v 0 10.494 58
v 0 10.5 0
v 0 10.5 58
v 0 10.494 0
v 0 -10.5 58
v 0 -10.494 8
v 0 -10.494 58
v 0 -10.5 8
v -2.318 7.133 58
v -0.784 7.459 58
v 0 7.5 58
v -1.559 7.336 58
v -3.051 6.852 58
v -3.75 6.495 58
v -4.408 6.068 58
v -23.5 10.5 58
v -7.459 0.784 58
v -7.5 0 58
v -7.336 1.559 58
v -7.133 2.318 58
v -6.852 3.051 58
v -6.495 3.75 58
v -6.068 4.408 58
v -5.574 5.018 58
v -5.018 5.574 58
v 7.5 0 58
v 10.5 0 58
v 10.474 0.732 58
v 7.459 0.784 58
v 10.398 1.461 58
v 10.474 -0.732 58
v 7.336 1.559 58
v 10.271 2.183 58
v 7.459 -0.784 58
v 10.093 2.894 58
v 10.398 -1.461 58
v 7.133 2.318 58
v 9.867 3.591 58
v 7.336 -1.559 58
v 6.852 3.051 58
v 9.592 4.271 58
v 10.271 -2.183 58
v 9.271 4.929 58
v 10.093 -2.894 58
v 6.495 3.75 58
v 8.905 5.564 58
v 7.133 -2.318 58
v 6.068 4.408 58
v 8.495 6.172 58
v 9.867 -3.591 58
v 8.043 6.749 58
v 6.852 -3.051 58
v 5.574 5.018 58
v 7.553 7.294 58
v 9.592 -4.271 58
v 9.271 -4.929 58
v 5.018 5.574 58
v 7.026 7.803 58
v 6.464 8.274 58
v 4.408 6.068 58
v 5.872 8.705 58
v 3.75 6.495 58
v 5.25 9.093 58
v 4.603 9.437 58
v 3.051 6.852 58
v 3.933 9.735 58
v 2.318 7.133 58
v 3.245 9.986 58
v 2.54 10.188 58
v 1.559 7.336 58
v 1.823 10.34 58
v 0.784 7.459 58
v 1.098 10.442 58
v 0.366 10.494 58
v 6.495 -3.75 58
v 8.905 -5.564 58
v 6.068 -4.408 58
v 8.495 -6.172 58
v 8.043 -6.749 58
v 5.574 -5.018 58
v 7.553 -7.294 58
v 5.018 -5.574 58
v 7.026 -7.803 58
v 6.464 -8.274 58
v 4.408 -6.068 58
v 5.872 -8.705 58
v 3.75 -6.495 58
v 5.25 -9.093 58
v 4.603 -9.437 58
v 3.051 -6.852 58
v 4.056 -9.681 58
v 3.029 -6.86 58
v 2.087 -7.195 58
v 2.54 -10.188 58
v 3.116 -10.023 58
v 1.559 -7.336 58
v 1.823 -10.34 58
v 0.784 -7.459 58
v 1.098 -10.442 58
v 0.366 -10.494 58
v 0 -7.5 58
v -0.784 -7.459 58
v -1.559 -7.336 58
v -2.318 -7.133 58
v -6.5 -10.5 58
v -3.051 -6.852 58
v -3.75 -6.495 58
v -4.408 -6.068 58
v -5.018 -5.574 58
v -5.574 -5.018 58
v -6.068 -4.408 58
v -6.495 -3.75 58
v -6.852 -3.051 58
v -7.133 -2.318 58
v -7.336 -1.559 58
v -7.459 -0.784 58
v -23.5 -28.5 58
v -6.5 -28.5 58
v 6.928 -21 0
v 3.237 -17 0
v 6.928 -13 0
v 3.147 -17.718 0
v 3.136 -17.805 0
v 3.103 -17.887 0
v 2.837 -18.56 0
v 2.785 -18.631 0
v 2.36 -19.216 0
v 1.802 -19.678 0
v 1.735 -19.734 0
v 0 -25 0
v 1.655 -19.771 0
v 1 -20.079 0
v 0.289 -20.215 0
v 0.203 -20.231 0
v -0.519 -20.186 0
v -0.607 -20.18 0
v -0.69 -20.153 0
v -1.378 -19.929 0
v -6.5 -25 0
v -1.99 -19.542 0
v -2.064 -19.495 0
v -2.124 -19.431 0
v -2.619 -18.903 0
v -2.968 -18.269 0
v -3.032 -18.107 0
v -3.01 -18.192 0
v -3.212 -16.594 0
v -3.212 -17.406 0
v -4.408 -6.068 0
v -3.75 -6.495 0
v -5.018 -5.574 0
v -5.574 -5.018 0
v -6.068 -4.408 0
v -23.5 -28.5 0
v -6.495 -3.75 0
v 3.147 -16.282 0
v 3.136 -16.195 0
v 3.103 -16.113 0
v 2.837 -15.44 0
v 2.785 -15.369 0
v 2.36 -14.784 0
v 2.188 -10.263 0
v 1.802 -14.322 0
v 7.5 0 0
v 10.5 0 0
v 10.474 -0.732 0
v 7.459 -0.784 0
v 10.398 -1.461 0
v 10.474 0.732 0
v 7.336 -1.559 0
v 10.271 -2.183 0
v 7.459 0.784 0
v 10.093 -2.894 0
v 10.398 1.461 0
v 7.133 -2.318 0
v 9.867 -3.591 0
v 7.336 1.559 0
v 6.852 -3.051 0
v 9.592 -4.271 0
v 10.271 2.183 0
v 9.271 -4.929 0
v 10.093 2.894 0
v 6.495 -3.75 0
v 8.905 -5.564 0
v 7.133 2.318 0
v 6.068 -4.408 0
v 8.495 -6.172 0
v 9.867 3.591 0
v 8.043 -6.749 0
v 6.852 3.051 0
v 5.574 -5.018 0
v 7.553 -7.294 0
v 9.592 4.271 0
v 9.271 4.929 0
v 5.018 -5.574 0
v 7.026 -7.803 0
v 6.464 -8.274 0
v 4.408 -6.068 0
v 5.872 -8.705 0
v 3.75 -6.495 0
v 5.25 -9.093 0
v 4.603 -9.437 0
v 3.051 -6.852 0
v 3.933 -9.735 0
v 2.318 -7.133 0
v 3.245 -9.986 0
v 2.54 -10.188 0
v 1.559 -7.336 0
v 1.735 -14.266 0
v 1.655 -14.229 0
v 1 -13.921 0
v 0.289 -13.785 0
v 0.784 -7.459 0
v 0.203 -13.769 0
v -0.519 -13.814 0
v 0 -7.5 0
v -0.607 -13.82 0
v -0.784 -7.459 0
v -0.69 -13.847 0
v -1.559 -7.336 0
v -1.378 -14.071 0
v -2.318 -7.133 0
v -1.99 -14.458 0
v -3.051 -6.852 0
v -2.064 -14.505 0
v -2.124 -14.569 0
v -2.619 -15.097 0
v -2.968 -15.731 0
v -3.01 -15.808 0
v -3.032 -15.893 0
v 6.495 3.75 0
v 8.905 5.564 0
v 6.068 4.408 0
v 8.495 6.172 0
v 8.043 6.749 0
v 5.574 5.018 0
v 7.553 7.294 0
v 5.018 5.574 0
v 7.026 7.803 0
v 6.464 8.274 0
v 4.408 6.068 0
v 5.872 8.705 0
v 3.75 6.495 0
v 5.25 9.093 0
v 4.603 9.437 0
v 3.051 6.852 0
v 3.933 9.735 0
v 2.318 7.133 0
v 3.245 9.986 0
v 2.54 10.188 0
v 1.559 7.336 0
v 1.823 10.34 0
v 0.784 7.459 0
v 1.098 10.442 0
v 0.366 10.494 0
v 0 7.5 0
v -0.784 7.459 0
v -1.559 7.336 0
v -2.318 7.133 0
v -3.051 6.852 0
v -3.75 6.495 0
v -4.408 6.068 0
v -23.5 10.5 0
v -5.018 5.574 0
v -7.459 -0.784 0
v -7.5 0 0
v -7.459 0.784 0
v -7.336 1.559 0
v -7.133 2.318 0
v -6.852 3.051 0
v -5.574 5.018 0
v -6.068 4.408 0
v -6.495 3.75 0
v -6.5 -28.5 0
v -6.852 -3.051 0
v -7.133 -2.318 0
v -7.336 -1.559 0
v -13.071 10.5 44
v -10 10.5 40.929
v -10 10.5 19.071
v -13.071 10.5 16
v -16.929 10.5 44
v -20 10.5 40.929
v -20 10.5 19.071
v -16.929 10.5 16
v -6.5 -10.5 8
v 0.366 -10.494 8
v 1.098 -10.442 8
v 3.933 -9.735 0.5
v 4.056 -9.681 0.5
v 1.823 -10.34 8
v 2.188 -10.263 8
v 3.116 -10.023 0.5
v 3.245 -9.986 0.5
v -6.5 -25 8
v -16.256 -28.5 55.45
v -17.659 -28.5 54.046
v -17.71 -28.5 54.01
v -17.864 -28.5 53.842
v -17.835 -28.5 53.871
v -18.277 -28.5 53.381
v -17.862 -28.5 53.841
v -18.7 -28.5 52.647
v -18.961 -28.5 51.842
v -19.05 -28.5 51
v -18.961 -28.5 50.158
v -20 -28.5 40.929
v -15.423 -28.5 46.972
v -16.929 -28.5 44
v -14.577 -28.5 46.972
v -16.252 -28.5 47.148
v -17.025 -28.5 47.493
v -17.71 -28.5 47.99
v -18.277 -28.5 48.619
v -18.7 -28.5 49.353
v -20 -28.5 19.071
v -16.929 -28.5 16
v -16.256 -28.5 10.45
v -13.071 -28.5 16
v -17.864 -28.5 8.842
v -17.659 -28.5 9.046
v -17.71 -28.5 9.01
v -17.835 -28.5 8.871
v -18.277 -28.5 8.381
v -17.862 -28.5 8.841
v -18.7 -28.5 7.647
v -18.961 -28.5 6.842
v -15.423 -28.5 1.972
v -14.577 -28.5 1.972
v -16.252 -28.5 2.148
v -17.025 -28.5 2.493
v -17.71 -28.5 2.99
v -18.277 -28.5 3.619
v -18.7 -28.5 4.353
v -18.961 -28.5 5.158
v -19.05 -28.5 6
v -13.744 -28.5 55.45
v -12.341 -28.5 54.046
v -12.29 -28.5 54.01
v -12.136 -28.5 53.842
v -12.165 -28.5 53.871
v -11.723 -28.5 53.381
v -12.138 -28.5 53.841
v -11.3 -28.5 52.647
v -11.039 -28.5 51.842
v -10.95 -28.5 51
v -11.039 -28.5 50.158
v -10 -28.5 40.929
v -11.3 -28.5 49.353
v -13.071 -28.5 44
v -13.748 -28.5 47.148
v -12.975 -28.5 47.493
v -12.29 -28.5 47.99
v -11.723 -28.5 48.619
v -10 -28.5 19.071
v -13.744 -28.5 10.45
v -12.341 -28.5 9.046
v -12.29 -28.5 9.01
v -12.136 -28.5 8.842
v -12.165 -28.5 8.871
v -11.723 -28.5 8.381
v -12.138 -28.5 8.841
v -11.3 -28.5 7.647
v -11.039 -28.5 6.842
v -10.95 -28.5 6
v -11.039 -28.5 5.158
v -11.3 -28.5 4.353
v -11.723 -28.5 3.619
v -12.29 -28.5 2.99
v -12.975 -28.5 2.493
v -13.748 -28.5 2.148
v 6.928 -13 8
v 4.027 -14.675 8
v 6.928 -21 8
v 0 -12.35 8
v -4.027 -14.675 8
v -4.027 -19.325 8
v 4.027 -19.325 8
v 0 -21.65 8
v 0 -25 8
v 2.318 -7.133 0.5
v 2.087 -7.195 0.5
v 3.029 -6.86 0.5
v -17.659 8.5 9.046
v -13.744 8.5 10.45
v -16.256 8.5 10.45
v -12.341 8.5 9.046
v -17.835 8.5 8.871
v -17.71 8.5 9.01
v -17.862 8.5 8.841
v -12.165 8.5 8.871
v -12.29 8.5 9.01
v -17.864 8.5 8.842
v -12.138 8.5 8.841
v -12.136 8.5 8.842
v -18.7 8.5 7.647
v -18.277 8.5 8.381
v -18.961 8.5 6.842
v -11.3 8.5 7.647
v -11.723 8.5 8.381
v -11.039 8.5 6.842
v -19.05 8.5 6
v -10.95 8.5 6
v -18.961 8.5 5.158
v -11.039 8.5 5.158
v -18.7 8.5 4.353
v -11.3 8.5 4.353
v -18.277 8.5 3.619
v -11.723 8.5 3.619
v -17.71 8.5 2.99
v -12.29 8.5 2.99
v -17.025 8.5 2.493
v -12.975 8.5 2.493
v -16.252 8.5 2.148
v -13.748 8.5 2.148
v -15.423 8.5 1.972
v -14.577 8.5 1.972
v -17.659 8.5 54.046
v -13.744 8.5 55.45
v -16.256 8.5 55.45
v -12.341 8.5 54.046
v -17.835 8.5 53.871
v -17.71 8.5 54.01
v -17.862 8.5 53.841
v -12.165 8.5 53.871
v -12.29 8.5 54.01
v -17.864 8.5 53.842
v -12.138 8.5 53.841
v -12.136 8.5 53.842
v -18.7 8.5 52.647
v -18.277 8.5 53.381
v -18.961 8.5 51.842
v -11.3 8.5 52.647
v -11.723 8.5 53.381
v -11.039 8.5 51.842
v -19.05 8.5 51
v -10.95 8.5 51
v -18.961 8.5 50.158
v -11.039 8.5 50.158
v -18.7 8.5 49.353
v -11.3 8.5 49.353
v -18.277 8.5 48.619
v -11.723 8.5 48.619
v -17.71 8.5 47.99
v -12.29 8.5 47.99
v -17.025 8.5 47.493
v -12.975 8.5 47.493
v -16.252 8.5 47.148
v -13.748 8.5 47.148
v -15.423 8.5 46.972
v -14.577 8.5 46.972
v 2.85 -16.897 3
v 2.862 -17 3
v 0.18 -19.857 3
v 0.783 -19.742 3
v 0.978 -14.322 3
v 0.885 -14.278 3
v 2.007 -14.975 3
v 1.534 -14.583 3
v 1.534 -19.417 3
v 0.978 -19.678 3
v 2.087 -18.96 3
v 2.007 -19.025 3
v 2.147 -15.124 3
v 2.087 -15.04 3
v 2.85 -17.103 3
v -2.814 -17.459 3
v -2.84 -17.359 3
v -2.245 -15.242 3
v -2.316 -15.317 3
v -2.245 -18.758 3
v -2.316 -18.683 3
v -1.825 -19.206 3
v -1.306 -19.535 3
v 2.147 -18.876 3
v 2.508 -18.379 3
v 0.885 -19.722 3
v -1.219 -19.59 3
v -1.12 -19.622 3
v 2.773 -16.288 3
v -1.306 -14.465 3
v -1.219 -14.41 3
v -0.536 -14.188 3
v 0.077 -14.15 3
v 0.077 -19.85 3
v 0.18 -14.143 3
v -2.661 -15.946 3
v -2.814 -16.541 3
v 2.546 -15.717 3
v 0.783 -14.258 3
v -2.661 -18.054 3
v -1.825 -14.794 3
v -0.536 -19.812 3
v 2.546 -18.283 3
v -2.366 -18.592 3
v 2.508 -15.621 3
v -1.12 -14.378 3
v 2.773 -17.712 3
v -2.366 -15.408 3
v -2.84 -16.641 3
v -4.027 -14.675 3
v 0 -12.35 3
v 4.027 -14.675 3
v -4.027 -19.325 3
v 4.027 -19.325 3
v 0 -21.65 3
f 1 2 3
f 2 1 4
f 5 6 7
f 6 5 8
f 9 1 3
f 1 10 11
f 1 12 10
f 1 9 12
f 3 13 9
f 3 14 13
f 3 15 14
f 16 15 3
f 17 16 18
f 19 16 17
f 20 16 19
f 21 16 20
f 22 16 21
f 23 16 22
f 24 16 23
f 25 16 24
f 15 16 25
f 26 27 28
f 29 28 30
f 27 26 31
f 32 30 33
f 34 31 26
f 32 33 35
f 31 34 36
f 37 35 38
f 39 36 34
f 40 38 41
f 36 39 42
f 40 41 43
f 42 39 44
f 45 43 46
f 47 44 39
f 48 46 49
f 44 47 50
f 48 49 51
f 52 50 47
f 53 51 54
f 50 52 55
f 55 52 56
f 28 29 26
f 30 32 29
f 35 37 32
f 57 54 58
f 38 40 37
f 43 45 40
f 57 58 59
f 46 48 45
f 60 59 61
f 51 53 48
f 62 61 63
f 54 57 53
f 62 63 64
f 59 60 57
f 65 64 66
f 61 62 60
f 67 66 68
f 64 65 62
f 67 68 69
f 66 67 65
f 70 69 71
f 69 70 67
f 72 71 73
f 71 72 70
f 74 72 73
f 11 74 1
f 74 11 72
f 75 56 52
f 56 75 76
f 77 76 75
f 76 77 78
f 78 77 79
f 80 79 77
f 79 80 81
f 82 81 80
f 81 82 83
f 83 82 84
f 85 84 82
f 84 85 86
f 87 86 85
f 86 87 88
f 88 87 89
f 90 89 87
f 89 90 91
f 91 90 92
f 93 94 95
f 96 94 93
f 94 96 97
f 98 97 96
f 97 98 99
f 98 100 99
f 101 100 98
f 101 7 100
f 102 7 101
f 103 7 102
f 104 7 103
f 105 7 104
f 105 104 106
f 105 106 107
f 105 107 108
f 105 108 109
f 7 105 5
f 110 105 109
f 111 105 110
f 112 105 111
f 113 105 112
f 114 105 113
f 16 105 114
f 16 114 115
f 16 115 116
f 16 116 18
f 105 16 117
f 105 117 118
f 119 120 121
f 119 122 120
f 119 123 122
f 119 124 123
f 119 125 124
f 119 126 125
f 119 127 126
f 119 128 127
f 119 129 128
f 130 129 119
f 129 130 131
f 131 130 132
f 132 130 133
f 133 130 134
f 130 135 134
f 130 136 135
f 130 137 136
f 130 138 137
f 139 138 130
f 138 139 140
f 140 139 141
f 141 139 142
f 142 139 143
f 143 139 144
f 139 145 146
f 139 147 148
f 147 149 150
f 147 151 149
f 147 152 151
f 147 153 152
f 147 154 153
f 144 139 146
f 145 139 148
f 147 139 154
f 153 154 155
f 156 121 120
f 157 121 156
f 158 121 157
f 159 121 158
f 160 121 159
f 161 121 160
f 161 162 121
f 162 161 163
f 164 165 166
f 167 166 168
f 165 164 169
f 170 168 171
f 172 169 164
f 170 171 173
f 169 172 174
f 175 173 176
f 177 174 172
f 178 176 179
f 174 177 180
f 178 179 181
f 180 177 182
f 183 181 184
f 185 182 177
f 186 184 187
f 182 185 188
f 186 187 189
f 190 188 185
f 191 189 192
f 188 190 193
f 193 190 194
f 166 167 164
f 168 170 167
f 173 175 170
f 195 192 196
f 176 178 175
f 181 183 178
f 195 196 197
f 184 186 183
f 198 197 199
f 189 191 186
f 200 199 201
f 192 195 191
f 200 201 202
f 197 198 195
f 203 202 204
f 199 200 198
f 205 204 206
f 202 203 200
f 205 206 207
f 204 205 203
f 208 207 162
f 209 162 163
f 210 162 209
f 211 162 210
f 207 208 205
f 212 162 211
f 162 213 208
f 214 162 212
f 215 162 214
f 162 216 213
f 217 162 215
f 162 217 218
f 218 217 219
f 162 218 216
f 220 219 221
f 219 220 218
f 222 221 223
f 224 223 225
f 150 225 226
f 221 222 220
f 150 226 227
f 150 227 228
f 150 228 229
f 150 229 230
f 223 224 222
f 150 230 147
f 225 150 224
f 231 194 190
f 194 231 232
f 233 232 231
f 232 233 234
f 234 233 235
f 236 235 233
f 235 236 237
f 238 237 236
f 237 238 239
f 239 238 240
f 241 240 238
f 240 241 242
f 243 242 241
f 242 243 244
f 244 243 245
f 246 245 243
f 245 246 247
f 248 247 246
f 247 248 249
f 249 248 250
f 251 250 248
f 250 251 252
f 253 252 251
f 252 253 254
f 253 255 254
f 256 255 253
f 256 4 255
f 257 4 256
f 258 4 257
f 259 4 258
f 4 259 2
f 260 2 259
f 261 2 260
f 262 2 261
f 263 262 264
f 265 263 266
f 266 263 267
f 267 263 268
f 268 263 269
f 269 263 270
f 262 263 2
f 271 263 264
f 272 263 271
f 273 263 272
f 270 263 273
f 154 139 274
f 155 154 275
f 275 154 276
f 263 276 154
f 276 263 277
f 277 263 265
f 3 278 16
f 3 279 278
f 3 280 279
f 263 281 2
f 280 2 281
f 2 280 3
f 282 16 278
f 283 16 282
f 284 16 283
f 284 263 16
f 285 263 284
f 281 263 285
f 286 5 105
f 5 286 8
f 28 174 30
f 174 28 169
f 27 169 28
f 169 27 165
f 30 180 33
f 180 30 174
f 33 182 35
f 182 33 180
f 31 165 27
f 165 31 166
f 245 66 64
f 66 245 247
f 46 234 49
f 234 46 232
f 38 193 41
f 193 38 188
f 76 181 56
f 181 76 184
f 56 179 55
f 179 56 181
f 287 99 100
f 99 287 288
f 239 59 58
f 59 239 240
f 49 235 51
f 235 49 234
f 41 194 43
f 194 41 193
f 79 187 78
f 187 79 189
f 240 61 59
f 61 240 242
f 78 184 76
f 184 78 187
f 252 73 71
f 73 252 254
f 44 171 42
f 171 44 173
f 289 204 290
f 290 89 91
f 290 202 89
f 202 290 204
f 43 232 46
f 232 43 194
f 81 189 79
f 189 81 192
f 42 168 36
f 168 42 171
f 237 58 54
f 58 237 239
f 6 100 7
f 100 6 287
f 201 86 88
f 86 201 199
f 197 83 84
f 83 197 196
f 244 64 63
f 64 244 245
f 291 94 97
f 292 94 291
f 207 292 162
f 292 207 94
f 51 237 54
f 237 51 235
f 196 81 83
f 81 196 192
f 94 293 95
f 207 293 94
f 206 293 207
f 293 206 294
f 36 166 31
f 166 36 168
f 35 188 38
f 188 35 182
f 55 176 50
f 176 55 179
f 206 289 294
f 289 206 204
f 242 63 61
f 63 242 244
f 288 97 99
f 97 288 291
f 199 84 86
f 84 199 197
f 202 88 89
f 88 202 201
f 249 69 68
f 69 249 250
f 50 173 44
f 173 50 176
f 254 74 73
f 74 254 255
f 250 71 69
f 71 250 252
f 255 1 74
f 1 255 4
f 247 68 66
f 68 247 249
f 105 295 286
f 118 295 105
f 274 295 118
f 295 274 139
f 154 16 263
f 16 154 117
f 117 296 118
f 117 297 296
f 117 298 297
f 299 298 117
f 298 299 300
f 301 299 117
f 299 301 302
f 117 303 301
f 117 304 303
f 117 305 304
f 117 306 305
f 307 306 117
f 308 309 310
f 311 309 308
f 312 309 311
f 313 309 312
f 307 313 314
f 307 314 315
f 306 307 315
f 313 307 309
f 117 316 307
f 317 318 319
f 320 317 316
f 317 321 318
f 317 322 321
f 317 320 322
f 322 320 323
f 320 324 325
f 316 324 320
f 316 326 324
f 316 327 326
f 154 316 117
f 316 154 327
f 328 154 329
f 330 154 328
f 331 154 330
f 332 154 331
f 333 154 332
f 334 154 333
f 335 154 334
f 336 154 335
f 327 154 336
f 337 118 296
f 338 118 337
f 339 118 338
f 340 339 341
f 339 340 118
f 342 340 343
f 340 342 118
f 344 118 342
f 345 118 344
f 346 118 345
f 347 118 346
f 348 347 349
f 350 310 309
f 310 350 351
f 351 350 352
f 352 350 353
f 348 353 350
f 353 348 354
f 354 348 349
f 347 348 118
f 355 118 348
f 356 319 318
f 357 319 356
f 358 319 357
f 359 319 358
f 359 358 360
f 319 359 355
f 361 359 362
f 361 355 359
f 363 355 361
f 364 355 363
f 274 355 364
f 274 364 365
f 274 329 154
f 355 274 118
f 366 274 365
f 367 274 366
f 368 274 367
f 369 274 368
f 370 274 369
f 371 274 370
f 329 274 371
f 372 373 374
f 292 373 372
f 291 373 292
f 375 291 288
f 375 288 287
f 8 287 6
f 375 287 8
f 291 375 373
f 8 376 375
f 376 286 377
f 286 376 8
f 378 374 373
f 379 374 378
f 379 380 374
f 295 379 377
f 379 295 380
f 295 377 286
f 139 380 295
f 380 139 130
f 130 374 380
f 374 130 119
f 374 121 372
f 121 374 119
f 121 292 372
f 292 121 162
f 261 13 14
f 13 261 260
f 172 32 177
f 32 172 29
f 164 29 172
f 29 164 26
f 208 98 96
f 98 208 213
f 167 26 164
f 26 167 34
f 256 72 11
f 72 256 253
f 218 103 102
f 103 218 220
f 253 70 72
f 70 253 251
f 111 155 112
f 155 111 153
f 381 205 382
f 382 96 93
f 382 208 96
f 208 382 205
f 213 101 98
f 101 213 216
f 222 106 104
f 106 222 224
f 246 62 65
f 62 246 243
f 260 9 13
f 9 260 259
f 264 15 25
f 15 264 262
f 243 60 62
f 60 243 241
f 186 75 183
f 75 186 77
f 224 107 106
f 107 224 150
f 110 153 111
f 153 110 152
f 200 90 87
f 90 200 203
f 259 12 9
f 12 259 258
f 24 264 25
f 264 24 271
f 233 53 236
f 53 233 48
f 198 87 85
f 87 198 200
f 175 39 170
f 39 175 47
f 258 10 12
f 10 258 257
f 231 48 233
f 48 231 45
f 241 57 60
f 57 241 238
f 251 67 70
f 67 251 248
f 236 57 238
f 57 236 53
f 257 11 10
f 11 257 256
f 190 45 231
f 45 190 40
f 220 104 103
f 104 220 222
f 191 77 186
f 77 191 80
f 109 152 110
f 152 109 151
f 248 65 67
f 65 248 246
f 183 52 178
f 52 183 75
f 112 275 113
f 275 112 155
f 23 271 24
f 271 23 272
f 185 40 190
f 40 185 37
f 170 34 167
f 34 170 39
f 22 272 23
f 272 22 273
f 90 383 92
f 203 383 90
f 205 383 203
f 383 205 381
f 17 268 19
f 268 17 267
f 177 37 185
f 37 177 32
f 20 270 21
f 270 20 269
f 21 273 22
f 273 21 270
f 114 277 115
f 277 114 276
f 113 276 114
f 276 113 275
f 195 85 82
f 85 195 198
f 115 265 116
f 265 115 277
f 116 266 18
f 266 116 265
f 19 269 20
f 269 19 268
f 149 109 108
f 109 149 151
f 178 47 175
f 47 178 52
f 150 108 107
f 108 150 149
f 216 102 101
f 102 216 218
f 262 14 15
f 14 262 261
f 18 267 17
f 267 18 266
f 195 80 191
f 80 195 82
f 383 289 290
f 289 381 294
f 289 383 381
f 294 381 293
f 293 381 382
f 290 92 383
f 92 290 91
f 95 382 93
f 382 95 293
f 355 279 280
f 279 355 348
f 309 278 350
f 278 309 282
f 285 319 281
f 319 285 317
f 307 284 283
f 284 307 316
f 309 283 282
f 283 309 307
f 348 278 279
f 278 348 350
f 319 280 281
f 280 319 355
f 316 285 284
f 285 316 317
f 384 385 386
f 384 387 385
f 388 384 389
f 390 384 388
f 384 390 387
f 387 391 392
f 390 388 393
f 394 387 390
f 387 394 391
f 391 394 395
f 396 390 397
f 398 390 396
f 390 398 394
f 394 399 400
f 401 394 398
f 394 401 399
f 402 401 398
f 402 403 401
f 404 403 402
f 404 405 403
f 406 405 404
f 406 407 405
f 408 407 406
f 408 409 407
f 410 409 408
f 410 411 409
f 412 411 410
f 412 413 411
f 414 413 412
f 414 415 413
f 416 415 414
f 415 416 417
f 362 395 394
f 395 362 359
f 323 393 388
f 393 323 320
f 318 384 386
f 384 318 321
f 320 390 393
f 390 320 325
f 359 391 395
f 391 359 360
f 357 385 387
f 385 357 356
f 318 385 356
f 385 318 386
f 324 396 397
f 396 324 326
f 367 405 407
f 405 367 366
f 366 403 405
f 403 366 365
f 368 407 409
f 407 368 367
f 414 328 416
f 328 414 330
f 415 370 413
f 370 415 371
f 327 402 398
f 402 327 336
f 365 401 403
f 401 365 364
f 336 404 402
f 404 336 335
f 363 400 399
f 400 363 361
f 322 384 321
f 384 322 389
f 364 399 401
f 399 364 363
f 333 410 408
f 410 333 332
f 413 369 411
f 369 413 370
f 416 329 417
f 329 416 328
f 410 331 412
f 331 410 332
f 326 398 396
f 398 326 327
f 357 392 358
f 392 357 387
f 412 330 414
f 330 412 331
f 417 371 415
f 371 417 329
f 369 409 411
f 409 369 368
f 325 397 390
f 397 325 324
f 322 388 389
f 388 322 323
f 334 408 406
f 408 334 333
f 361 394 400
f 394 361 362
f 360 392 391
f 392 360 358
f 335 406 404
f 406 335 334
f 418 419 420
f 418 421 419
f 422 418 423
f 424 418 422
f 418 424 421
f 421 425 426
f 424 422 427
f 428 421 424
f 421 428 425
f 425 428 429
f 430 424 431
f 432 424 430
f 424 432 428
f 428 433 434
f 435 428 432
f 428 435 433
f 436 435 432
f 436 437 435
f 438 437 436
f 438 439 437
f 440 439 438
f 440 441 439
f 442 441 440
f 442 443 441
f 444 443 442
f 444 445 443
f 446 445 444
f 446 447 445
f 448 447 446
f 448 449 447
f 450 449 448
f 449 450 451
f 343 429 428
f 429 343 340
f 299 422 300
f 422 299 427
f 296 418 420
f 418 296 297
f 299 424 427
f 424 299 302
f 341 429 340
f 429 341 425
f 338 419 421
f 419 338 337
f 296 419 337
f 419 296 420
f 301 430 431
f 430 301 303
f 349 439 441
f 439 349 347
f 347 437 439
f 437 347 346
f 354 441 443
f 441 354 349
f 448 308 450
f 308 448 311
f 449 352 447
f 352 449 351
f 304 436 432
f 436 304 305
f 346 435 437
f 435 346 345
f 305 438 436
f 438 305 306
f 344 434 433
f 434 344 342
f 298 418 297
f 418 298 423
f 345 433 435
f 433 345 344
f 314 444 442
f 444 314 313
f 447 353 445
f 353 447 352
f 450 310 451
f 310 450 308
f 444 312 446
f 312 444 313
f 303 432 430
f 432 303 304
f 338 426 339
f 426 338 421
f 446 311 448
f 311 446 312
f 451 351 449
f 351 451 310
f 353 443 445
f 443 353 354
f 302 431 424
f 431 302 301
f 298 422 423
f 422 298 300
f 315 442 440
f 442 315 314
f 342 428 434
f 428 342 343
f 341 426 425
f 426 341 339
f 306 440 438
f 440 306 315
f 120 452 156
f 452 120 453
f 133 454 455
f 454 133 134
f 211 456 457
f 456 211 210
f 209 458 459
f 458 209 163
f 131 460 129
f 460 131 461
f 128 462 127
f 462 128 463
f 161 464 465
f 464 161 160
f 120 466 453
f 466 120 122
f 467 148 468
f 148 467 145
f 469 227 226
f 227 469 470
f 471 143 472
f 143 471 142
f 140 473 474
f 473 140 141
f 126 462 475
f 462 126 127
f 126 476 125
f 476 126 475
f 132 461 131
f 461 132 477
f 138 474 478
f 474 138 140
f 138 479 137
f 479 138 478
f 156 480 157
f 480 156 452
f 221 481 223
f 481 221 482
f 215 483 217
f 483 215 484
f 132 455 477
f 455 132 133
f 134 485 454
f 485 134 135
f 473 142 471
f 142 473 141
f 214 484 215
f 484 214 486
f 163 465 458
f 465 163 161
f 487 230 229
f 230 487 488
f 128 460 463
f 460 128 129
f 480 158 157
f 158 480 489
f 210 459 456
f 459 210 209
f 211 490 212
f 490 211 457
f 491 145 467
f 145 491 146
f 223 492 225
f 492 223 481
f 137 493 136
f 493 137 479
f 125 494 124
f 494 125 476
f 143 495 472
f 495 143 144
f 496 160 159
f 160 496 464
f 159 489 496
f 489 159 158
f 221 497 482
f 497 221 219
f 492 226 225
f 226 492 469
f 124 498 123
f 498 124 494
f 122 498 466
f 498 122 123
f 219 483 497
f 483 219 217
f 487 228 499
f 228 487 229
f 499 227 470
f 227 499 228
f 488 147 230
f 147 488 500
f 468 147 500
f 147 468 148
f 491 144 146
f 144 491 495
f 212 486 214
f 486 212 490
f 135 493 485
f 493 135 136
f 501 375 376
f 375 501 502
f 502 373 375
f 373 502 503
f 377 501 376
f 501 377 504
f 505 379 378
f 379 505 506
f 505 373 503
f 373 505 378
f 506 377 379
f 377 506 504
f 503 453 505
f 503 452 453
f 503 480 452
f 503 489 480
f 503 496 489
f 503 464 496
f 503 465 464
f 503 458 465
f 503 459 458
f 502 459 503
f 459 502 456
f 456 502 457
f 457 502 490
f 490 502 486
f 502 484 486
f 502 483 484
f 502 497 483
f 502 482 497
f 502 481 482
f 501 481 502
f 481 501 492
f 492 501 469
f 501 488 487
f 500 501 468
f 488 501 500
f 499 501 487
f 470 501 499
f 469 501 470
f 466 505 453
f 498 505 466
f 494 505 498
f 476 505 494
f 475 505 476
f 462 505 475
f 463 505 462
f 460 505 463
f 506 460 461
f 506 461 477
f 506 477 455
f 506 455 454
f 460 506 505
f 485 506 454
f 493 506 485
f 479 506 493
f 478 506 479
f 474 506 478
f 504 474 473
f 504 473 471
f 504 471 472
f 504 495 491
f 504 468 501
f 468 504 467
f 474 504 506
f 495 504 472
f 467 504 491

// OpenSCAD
// file: bearing.scad
// PRUSA iteration3
// Bearing holders
// GNU GPL v3
// Josef Průša <iam@josefprusa.cz> and contributors
// http://www.reprap.org/wiki/Prusa_Mendel
// http://prusamendel.org

bearing_diameter = 15;

module horizontal_bearing_base(bearings=1) {
  translate(v=[0,0,6]) cube(size = [24,8+bearings*25,12], center = true);
}

module horizontal_bearing_holes(bearings=1) {
  cutter_lenght = 10+bearings*25;
  one_holder_lenght = 8+25;
  holder_lenght = 8+bearings*25;

  // Main bearing cut
  difference() {
    translate(v = [0,0,12]) rotate(a = [90,0,0]) translate(v = [0,0,-cutter_lenght/2]) cylinder(h = cutter_lenght, r = bearing_diameter/2, $fn = 50);
    // Bearing retainers
    translate(v=[0,1-holder_lenght/2,3]) cube(size = [24,6,8], center = true);
    translate(v=[0,-1+holder_lenght/2,3]) cube(size = [24,6,8], center = true);
  }

  // Ziptie cutouts
  ziptie_cut_ofset = 0;

  for (i = [0:bearings-1]) {
    // For easier positioning I move them by half of one
    // bearing holder then add each bearign lenght and then center again
    translate(v = [0,-holder_lenght/2,0]) translate(v = [0,one_holder_lenght/2+i*25,0]) difference(){
      union(){
        translate(v = [0,2-6,12]) rotate(a = [90,0,0]) translate(v = [0,0,0]) cylinder(h = 4, r = 12.5, $fn = 50);
        translate(v = [0,2+6,12]) rotate(a = [90,0,0]) translate(v = [0,0,0]) cylinder(h = 4, r = 12.5, $fn = 50);
      }
      translate(v = [0,10,12]) rotate(a = [90,0,0]) translate(v = [0,0,0]) cylinder(h = 24, r = 10, $fn = 50);
    }
  }
}

module horizontal_bearing_test() {
  difference(){
    horizontal_bearing_base(1);
    horizontal_bearing_holes(1);
  }
  translate(v=[30,0,0]) difference(){
    horizontal_bearing_base(2);
    horizontal_bearing_holes(2);
  }
  translate(v=[60,0,0]) difference(){
    horizontal_bearing_base(3);
    horizontal_bearing_holes(3);
  }
}

thinwall = 3;
bearing_size = bearing_diameter + 2 * thinwall;

module vertical_bearing_base() {
  translate(v = [-2-bearing_size/4,0,29]) cube(size = [4+bearing_size/2,bearing_size,58], center = true);
  cylinder(h = 58, r=bearing_size/2, $fn = 90);
}

module vertical_bearing_holes() {
  translate(v = [0,0,-1]) cylinder(h = 62, r = bearing_diameter/2, $fn = 60);
  rotate(a = [0,0,-70]) translate(v = [8,0,31.5]) cube(size = [5,1,62], center = true);
}

difference() {
  vertical_bearing_base();
  vertical_bearing_holes();
}
// main file
// PRUSA iteration3
// X end prototype
// GNU GPL v3
// Josef Průša <iam@josefprusa.cz> and contributors
// http://www.reprap.org/wiki/Prusa_Mendel
// http://prusamendel.org

use <bearing.scad>
rod_distance = 45;
m5_tolerance = 0.3;

module x_end_base() {
  // Main block
  height = 58;

  translate(v = [-15,-9,height/2]) cube(size = [17,39,height], center = true);

  // Bearing holder
  vertical_bearing_base();

  // Nut trap
  // Cube
  translate(v = [-2-2,-17,4]) cube(size = [8,16,8], center = true);
  // Hexagon
  translate(v = [0,-17,0]) rotate([0,0,30]) cylinder(h = 8, r = 8, $fn = 6);
}

module x_end_holes() {
  vertical_bearing_holes();

  // Belt hole
  translate(v = [-1,0,0])

  difference() {
    translate(v = [-5.5-10+1.5,-10,30]) cube(size = [10,46,28], center = true);

  	// Nice edges
  	translate(v = [-5.5-10+1.5,-10,30+23]) rotate([0,45,0]) cube(size = [10,46,28], center = true);
  	translate(v = [-5.5-10+1.5,-10,30+23]) rotate([0,-45,0]) cube(size = [10,46,28], center = true);
  	translate(v = [-5.5-10+1.5,-10,30-23]) rotate([0,45,0]) cube(size = [10,46,28], center = true);
  	translate(v = [-5.5-10+1.5,-10,30-23]) rotate([0,-45,0]) cube(size = [10,46,28], center = true);
}

  // Bottom pushfit rod
  translate(v = [-15,-41.5,6]) rotate(a = [-90,0,0]) pushfit_rod(8.1,50);

  // Top pushfit rod
  translate(v = [-15,-41.5,rod_distance+6]) rotate(a = [-90,0,0]) pushfit_rod(8.1,50);

  // Nut trap
  translate(v = [0,-17,-0.5]) cylinder(h = 4, r1 = 3.3, r2 = 2.8, $fn = 25);
  translate(v = [0,-17,3]) rotate([0,0,30]) cylinder(h = 10, r=4.5+m5_tolerance/2, $fn = 6);
}

// Final prototype
module x_end_plain() {
  difference() {
    x_end_base();
    x_end_holes();
  }
}

x_end_plain();

module pushfit_rod(diameter,length) {
  cylinder(h = length, r = diameter/2, $fn = 30);
  difference() {
 	  translate(v = [0,-diameter/2.85,length/2]) rotate([0,0,45]) cube(size = [diameter/2,diameter/2,length], center = true);
 	  translate(v = [0,-diameter/4-diameter/2-0.4,length/2]) rotate([0,0,0]) cube(size = [diameter,diameter/2,length], center = true);
  }
  //translate(v=[0,-diameter/2-2,length/2]) cube(size = [diameter,1,length], center = true);
}
